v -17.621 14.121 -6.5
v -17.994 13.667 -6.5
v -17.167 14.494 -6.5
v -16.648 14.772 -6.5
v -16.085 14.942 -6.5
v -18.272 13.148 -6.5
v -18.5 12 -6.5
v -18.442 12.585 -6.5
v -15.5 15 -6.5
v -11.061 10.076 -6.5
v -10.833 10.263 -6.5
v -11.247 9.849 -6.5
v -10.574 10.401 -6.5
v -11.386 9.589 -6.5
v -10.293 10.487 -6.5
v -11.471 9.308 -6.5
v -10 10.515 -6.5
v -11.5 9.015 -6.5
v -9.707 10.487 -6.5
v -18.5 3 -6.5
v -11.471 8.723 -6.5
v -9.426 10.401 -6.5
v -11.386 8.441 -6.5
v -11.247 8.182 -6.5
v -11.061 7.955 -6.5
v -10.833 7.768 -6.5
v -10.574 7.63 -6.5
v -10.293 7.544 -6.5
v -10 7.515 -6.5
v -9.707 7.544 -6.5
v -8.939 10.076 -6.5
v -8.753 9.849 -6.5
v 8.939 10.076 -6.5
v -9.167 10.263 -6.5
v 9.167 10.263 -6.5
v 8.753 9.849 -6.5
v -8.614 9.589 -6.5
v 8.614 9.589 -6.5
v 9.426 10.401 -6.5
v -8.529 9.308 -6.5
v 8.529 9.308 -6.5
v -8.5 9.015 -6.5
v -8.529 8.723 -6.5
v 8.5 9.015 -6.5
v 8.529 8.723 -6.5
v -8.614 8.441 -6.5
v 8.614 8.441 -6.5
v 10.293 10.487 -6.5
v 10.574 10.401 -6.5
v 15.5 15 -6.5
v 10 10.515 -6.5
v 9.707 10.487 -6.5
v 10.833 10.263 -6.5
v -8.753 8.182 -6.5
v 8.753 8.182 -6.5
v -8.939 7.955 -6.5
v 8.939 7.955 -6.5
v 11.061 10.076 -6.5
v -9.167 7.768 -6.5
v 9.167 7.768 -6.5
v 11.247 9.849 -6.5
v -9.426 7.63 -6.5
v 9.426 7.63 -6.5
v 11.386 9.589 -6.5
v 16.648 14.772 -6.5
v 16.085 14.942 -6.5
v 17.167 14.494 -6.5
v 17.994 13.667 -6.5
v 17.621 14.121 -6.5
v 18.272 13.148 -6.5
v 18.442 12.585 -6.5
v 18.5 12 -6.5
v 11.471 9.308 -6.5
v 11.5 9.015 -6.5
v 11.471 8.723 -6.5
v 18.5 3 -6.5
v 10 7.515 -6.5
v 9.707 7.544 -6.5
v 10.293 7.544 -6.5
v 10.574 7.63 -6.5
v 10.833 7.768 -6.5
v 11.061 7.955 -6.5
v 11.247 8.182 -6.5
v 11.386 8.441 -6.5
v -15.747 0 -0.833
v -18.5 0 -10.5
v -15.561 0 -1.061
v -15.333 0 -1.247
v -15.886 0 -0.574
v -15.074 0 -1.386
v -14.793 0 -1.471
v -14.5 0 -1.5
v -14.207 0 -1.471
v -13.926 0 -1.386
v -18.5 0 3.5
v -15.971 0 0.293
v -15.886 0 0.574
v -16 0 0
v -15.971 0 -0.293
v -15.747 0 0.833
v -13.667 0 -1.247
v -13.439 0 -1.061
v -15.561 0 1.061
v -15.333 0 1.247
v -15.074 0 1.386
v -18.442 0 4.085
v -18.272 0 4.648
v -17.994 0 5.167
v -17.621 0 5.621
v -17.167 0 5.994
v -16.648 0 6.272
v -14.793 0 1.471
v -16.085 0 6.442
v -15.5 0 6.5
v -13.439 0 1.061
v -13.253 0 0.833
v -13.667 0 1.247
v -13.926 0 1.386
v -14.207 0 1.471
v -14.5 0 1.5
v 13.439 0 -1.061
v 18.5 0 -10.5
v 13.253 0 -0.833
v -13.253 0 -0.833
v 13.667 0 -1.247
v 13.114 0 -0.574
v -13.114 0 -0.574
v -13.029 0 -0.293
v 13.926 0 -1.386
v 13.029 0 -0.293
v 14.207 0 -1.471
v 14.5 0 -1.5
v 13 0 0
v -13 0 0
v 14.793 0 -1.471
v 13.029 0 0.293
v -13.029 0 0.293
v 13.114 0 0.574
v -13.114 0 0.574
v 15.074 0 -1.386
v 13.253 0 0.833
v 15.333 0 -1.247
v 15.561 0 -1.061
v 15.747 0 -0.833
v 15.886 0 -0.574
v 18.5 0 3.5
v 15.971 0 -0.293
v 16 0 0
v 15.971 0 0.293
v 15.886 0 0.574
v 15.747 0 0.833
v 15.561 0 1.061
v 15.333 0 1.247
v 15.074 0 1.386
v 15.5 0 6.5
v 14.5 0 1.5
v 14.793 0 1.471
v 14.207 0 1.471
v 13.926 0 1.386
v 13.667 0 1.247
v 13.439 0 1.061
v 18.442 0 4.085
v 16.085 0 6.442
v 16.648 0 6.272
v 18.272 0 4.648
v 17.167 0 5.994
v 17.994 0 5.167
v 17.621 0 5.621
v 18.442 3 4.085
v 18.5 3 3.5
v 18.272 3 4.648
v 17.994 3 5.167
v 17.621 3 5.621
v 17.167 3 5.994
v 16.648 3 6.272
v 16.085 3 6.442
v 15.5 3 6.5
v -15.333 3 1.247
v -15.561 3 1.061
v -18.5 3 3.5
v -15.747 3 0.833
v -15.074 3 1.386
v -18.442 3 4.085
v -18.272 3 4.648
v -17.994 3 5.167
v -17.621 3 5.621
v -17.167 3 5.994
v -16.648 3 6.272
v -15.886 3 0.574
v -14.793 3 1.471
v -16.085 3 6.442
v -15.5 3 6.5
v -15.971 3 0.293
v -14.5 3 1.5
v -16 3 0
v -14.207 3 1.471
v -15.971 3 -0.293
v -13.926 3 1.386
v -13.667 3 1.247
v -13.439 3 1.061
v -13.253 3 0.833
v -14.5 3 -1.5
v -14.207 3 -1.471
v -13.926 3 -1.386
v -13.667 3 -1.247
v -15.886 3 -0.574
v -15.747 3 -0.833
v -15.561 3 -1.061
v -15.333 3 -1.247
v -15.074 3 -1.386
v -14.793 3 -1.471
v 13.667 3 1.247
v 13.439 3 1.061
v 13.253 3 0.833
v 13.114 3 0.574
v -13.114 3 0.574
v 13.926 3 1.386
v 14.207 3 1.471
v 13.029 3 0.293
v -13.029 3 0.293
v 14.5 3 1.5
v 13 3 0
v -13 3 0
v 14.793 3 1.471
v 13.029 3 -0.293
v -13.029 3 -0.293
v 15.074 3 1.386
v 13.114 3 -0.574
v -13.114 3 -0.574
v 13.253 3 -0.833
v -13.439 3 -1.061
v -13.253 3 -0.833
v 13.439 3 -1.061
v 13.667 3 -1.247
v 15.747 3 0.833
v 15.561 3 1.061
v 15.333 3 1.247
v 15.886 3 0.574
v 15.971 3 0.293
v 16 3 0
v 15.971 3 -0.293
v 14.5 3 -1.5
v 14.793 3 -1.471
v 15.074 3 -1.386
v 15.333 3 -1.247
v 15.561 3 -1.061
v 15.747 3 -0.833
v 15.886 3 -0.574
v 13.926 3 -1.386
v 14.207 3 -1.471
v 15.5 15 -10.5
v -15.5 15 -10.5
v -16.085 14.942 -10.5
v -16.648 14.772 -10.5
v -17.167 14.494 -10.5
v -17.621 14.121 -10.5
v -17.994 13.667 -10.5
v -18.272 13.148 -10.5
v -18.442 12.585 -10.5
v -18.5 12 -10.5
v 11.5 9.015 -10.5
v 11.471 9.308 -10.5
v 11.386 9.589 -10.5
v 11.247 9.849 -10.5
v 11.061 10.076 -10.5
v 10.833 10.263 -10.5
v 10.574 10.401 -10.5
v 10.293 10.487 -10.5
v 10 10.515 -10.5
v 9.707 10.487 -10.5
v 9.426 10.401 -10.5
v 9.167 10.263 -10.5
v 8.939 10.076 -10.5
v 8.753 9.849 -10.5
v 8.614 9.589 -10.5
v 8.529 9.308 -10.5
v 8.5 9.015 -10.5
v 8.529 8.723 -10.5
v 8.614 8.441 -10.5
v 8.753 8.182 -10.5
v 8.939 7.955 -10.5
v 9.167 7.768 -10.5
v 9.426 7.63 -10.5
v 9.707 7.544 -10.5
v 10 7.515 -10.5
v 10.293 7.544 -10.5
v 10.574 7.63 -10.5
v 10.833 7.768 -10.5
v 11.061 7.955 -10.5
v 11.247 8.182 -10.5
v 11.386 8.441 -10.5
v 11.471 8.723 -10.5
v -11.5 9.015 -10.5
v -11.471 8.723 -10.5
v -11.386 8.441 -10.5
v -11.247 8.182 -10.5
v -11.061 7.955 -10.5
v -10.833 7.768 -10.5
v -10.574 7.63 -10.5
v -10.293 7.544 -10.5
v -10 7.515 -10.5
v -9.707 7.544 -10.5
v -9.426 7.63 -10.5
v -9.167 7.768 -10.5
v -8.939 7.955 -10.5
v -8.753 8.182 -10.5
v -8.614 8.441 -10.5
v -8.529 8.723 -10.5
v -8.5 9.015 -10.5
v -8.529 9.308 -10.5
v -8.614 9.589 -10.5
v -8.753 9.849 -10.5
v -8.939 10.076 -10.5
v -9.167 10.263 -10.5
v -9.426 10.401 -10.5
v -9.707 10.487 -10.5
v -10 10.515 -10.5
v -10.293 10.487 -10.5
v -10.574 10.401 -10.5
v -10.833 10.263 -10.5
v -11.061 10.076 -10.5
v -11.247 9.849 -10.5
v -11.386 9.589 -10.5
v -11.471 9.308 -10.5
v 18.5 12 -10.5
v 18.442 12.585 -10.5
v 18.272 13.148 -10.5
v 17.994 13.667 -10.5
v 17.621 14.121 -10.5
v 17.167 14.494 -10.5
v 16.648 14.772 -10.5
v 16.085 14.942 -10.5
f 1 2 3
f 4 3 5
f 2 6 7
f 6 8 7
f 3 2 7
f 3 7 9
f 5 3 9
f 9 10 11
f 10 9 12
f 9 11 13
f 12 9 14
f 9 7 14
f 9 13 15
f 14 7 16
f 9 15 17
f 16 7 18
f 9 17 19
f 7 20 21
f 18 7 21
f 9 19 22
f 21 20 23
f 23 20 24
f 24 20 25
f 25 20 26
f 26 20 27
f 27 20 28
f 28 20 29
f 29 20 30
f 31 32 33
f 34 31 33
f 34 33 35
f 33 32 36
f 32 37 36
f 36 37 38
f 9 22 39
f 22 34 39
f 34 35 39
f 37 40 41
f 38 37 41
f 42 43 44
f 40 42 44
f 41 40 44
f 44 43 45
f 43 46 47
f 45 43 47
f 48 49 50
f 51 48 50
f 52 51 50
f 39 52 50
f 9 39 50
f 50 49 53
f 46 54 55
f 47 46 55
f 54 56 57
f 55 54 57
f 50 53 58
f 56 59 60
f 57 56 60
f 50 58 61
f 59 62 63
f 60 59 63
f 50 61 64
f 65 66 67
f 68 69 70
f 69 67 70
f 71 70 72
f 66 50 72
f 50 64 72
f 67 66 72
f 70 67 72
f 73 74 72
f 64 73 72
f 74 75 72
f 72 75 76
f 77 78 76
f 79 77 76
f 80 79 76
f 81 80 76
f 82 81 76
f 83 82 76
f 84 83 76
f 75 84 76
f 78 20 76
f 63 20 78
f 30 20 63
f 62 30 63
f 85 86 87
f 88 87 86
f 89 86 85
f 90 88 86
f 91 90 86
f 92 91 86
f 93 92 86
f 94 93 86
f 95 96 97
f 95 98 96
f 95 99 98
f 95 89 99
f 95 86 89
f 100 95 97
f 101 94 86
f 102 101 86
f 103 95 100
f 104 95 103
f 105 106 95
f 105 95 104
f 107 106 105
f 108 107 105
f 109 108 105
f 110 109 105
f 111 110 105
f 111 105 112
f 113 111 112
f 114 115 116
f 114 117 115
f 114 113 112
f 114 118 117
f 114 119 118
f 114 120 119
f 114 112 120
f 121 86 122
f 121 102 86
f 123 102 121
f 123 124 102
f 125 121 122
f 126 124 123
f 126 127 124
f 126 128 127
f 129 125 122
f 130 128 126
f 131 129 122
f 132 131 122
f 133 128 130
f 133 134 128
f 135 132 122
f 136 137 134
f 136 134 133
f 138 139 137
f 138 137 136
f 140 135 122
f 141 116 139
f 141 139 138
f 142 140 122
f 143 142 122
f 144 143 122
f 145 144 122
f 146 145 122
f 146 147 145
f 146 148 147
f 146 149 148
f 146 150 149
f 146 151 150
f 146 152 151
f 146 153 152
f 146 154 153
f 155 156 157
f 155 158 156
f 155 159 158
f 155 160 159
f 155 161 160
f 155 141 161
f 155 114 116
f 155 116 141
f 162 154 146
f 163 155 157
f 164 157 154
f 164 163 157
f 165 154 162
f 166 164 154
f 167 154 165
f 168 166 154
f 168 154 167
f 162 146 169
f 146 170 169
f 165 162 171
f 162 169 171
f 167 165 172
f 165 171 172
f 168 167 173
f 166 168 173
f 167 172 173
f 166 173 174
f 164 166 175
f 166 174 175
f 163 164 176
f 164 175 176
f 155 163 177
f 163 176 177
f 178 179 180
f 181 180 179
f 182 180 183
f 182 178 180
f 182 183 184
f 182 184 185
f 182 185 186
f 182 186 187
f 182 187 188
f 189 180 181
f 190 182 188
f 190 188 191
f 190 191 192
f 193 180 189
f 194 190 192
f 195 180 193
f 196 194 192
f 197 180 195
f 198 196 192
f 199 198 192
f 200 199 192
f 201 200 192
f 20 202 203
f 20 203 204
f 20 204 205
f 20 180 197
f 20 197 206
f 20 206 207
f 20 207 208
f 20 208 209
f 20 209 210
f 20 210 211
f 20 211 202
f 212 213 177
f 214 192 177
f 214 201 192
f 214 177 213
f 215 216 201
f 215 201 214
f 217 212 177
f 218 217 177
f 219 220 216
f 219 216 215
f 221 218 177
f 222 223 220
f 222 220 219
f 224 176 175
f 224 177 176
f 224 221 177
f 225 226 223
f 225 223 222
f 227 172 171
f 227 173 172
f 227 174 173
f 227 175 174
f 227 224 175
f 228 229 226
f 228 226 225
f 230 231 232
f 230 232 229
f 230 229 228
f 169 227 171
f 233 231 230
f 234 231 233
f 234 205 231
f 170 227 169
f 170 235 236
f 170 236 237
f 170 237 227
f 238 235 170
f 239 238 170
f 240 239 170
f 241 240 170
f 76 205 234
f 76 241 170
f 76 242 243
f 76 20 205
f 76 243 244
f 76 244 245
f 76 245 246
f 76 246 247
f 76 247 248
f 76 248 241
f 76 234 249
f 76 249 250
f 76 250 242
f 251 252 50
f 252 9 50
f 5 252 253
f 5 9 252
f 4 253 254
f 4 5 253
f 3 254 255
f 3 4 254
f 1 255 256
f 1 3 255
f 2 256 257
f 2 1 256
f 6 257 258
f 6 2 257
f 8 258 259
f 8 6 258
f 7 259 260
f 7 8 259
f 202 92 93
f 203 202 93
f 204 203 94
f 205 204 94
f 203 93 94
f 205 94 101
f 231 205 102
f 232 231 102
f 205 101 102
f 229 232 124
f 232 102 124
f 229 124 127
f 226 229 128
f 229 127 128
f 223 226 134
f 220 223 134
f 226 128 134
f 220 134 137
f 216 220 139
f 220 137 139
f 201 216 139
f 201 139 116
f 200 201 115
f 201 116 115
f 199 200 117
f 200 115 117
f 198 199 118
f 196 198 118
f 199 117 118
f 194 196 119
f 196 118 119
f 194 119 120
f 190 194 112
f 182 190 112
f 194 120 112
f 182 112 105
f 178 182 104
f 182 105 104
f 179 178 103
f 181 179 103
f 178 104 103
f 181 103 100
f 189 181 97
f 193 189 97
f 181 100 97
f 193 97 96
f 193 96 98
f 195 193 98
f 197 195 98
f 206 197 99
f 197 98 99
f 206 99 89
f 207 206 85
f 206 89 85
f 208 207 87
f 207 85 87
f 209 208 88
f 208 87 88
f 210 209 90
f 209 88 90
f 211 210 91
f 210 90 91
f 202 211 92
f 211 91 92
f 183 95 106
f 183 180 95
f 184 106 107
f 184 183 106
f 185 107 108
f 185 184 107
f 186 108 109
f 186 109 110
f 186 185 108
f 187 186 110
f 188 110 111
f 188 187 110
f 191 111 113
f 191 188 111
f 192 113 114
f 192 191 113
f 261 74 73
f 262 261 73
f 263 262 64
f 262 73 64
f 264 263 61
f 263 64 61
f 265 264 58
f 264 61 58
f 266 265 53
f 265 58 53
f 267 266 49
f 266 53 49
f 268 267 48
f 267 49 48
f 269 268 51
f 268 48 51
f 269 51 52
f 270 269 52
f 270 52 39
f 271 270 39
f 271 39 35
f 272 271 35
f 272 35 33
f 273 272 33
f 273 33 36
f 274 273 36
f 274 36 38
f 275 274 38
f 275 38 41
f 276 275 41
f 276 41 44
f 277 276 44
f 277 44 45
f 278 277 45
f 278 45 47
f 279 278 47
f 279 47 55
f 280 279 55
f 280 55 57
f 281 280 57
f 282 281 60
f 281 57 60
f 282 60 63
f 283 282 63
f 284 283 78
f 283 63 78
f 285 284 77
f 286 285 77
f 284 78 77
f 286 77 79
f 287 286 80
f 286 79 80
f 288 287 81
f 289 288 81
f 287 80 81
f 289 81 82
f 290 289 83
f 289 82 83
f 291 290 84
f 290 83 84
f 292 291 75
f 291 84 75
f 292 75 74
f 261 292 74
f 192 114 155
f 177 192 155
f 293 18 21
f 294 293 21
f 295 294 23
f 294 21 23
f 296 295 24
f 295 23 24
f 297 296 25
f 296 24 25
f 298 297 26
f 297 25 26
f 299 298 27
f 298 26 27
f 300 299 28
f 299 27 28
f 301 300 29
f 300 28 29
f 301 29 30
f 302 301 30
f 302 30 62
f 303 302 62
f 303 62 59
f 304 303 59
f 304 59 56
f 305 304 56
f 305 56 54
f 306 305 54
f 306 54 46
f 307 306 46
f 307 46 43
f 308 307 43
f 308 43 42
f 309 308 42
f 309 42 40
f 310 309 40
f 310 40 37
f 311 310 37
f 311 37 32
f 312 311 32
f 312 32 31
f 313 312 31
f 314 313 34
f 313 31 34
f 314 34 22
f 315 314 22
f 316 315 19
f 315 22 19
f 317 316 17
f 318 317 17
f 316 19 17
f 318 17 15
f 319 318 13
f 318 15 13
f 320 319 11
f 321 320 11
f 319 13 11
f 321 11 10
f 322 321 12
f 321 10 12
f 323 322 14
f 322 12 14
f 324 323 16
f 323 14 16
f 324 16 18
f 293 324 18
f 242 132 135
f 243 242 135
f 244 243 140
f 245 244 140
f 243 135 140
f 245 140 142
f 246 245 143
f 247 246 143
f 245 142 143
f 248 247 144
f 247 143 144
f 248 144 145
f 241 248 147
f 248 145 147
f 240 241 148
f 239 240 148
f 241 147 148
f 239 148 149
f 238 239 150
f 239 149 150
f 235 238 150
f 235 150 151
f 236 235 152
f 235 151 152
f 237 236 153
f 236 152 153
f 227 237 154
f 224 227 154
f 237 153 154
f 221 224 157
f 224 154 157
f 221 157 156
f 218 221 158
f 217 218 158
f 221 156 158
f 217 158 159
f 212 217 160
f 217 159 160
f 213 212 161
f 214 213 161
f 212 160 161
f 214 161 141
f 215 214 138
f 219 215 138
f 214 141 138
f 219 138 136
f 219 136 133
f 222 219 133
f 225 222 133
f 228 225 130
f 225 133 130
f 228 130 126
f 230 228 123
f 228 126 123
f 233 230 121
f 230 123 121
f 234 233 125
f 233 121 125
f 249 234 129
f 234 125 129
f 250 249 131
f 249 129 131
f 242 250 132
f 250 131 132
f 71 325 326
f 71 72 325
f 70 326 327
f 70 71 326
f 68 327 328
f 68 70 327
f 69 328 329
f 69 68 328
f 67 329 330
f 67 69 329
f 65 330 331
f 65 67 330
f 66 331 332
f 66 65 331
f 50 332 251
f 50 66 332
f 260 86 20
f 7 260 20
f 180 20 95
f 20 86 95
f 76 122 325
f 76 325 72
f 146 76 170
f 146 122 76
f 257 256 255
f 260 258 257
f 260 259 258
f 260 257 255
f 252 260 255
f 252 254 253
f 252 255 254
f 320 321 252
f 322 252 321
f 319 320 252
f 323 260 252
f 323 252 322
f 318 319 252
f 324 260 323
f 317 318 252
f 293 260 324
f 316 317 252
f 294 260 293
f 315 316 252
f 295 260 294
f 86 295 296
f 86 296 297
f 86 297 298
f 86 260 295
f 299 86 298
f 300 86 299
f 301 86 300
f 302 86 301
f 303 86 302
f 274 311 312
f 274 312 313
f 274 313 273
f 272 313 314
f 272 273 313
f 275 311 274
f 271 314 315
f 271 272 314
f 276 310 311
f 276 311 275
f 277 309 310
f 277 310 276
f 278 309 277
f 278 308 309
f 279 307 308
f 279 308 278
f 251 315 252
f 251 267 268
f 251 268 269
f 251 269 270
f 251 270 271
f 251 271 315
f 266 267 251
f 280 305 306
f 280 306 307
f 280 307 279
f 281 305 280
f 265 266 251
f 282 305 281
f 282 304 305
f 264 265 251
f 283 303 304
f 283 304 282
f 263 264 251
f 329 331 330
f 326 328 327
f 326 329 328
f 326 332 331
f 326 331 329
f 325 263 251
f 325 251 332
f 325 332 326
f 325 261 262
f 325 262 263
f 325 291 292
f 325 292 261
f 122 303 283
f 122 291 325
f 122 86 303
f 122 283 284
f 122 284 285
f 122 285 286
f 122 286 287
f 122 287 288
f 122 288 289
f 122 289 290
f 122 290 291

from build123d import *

# Parameters (mm, degrees)
SKETCH_2_W          = 37
SKETCH_2_H          = 13
EXTRUDE_2_DEPTH     = 3
SKETCH_3_R          = 1.5
CUT_EXTRUDE_2_DEPTH = 3
SKETCH_4_W          = 37
SKETCH_4_H          = 4
EXTRUDE_3_DEPTH     = 15
FILLET_4_R          = 3
FILLET_5_R          = 3
SKETCH_5_R          = 1.5
CUT_EXTRUDE_3_DEPTH = 10
FILLET_6_R          = 3


with BuildPart() as part:
    # 草图2 → 凸台-拉伸2 (new body)
    with BuildSketch(Plane(origin=(0, 0, 0), x_dir=(1, 0, 0), z_dir=(0, 1, 0))):
        Rectangle(SKETCH_2_W, SKETCH_2_H)
    extrude(amount=EXTRUDE_2_DEPTH)

    # 草图3 → 切除-拉伸2 (cut)
    with BuildSketch(Plane.XZ):
        with Locations(Location((-14.5, 0, 0), (0, 0, 270))):
            Circle(SKETCH_3_R)
        with Locations(Location((14.5, 0, 0), (0, 0, 270))):
            Circle(SKETCH_3_R)
    extrude(amount=-CUT_EXTRUDE_2_DEPTH, mode=Mode.SUBTRACT)

    # 草图4 → 凸台-拉伸3 (add)
    with BuildSketch(Plane.XZ):
        with Locations((0, -8.5)):
            Rectangle(SKETCH_4_W, SKETCH_4_H)
    extrude(amount=-EXTRUDE_3_DEPTH)

    # 圆角4
    fillet_4_edges = [part.edges().sort_by_distance(p)[0] for p in [
        (18.5, 15, -8.5),
    ]]
    fillet(fillet_4_edges, radius=FILLET_4_R)

    # 圆角5
    fillet_5_edges = [part.edges().sort_by_distance(p)[0] for p in [
        (-18.5, 15, -8.5),
    ]]
    fillet(fillet_5_edges, radius=FILLET_5_R)

    # 草图5 → 切除-拉伸3 (cut)
    with BuildSketch(Plane.XY.offset(-6.5)):
        with Locations((10, 9.01536156)):
            Circle(SKETCH_5_R)
        with Locations(Location((-10, 9.01536156, 0), (0, 0, 180))):
            Circle(SKETCH_5_R)
    extrude(amount=-CUT_EXTRUDE_3_DEPTH, mode=Mode.SUBTRACT)

    # 圆角6
    fillet_6_edges = [part.edges().sort_by_distance(p)[0] for p in [
        (-18.5, 1.5, 6.5),
        (18.5, 1.5, 6.5),
    ]]
    fillet(fillet_6_edges, radius=FILLET_6_R)


solid = part.part
